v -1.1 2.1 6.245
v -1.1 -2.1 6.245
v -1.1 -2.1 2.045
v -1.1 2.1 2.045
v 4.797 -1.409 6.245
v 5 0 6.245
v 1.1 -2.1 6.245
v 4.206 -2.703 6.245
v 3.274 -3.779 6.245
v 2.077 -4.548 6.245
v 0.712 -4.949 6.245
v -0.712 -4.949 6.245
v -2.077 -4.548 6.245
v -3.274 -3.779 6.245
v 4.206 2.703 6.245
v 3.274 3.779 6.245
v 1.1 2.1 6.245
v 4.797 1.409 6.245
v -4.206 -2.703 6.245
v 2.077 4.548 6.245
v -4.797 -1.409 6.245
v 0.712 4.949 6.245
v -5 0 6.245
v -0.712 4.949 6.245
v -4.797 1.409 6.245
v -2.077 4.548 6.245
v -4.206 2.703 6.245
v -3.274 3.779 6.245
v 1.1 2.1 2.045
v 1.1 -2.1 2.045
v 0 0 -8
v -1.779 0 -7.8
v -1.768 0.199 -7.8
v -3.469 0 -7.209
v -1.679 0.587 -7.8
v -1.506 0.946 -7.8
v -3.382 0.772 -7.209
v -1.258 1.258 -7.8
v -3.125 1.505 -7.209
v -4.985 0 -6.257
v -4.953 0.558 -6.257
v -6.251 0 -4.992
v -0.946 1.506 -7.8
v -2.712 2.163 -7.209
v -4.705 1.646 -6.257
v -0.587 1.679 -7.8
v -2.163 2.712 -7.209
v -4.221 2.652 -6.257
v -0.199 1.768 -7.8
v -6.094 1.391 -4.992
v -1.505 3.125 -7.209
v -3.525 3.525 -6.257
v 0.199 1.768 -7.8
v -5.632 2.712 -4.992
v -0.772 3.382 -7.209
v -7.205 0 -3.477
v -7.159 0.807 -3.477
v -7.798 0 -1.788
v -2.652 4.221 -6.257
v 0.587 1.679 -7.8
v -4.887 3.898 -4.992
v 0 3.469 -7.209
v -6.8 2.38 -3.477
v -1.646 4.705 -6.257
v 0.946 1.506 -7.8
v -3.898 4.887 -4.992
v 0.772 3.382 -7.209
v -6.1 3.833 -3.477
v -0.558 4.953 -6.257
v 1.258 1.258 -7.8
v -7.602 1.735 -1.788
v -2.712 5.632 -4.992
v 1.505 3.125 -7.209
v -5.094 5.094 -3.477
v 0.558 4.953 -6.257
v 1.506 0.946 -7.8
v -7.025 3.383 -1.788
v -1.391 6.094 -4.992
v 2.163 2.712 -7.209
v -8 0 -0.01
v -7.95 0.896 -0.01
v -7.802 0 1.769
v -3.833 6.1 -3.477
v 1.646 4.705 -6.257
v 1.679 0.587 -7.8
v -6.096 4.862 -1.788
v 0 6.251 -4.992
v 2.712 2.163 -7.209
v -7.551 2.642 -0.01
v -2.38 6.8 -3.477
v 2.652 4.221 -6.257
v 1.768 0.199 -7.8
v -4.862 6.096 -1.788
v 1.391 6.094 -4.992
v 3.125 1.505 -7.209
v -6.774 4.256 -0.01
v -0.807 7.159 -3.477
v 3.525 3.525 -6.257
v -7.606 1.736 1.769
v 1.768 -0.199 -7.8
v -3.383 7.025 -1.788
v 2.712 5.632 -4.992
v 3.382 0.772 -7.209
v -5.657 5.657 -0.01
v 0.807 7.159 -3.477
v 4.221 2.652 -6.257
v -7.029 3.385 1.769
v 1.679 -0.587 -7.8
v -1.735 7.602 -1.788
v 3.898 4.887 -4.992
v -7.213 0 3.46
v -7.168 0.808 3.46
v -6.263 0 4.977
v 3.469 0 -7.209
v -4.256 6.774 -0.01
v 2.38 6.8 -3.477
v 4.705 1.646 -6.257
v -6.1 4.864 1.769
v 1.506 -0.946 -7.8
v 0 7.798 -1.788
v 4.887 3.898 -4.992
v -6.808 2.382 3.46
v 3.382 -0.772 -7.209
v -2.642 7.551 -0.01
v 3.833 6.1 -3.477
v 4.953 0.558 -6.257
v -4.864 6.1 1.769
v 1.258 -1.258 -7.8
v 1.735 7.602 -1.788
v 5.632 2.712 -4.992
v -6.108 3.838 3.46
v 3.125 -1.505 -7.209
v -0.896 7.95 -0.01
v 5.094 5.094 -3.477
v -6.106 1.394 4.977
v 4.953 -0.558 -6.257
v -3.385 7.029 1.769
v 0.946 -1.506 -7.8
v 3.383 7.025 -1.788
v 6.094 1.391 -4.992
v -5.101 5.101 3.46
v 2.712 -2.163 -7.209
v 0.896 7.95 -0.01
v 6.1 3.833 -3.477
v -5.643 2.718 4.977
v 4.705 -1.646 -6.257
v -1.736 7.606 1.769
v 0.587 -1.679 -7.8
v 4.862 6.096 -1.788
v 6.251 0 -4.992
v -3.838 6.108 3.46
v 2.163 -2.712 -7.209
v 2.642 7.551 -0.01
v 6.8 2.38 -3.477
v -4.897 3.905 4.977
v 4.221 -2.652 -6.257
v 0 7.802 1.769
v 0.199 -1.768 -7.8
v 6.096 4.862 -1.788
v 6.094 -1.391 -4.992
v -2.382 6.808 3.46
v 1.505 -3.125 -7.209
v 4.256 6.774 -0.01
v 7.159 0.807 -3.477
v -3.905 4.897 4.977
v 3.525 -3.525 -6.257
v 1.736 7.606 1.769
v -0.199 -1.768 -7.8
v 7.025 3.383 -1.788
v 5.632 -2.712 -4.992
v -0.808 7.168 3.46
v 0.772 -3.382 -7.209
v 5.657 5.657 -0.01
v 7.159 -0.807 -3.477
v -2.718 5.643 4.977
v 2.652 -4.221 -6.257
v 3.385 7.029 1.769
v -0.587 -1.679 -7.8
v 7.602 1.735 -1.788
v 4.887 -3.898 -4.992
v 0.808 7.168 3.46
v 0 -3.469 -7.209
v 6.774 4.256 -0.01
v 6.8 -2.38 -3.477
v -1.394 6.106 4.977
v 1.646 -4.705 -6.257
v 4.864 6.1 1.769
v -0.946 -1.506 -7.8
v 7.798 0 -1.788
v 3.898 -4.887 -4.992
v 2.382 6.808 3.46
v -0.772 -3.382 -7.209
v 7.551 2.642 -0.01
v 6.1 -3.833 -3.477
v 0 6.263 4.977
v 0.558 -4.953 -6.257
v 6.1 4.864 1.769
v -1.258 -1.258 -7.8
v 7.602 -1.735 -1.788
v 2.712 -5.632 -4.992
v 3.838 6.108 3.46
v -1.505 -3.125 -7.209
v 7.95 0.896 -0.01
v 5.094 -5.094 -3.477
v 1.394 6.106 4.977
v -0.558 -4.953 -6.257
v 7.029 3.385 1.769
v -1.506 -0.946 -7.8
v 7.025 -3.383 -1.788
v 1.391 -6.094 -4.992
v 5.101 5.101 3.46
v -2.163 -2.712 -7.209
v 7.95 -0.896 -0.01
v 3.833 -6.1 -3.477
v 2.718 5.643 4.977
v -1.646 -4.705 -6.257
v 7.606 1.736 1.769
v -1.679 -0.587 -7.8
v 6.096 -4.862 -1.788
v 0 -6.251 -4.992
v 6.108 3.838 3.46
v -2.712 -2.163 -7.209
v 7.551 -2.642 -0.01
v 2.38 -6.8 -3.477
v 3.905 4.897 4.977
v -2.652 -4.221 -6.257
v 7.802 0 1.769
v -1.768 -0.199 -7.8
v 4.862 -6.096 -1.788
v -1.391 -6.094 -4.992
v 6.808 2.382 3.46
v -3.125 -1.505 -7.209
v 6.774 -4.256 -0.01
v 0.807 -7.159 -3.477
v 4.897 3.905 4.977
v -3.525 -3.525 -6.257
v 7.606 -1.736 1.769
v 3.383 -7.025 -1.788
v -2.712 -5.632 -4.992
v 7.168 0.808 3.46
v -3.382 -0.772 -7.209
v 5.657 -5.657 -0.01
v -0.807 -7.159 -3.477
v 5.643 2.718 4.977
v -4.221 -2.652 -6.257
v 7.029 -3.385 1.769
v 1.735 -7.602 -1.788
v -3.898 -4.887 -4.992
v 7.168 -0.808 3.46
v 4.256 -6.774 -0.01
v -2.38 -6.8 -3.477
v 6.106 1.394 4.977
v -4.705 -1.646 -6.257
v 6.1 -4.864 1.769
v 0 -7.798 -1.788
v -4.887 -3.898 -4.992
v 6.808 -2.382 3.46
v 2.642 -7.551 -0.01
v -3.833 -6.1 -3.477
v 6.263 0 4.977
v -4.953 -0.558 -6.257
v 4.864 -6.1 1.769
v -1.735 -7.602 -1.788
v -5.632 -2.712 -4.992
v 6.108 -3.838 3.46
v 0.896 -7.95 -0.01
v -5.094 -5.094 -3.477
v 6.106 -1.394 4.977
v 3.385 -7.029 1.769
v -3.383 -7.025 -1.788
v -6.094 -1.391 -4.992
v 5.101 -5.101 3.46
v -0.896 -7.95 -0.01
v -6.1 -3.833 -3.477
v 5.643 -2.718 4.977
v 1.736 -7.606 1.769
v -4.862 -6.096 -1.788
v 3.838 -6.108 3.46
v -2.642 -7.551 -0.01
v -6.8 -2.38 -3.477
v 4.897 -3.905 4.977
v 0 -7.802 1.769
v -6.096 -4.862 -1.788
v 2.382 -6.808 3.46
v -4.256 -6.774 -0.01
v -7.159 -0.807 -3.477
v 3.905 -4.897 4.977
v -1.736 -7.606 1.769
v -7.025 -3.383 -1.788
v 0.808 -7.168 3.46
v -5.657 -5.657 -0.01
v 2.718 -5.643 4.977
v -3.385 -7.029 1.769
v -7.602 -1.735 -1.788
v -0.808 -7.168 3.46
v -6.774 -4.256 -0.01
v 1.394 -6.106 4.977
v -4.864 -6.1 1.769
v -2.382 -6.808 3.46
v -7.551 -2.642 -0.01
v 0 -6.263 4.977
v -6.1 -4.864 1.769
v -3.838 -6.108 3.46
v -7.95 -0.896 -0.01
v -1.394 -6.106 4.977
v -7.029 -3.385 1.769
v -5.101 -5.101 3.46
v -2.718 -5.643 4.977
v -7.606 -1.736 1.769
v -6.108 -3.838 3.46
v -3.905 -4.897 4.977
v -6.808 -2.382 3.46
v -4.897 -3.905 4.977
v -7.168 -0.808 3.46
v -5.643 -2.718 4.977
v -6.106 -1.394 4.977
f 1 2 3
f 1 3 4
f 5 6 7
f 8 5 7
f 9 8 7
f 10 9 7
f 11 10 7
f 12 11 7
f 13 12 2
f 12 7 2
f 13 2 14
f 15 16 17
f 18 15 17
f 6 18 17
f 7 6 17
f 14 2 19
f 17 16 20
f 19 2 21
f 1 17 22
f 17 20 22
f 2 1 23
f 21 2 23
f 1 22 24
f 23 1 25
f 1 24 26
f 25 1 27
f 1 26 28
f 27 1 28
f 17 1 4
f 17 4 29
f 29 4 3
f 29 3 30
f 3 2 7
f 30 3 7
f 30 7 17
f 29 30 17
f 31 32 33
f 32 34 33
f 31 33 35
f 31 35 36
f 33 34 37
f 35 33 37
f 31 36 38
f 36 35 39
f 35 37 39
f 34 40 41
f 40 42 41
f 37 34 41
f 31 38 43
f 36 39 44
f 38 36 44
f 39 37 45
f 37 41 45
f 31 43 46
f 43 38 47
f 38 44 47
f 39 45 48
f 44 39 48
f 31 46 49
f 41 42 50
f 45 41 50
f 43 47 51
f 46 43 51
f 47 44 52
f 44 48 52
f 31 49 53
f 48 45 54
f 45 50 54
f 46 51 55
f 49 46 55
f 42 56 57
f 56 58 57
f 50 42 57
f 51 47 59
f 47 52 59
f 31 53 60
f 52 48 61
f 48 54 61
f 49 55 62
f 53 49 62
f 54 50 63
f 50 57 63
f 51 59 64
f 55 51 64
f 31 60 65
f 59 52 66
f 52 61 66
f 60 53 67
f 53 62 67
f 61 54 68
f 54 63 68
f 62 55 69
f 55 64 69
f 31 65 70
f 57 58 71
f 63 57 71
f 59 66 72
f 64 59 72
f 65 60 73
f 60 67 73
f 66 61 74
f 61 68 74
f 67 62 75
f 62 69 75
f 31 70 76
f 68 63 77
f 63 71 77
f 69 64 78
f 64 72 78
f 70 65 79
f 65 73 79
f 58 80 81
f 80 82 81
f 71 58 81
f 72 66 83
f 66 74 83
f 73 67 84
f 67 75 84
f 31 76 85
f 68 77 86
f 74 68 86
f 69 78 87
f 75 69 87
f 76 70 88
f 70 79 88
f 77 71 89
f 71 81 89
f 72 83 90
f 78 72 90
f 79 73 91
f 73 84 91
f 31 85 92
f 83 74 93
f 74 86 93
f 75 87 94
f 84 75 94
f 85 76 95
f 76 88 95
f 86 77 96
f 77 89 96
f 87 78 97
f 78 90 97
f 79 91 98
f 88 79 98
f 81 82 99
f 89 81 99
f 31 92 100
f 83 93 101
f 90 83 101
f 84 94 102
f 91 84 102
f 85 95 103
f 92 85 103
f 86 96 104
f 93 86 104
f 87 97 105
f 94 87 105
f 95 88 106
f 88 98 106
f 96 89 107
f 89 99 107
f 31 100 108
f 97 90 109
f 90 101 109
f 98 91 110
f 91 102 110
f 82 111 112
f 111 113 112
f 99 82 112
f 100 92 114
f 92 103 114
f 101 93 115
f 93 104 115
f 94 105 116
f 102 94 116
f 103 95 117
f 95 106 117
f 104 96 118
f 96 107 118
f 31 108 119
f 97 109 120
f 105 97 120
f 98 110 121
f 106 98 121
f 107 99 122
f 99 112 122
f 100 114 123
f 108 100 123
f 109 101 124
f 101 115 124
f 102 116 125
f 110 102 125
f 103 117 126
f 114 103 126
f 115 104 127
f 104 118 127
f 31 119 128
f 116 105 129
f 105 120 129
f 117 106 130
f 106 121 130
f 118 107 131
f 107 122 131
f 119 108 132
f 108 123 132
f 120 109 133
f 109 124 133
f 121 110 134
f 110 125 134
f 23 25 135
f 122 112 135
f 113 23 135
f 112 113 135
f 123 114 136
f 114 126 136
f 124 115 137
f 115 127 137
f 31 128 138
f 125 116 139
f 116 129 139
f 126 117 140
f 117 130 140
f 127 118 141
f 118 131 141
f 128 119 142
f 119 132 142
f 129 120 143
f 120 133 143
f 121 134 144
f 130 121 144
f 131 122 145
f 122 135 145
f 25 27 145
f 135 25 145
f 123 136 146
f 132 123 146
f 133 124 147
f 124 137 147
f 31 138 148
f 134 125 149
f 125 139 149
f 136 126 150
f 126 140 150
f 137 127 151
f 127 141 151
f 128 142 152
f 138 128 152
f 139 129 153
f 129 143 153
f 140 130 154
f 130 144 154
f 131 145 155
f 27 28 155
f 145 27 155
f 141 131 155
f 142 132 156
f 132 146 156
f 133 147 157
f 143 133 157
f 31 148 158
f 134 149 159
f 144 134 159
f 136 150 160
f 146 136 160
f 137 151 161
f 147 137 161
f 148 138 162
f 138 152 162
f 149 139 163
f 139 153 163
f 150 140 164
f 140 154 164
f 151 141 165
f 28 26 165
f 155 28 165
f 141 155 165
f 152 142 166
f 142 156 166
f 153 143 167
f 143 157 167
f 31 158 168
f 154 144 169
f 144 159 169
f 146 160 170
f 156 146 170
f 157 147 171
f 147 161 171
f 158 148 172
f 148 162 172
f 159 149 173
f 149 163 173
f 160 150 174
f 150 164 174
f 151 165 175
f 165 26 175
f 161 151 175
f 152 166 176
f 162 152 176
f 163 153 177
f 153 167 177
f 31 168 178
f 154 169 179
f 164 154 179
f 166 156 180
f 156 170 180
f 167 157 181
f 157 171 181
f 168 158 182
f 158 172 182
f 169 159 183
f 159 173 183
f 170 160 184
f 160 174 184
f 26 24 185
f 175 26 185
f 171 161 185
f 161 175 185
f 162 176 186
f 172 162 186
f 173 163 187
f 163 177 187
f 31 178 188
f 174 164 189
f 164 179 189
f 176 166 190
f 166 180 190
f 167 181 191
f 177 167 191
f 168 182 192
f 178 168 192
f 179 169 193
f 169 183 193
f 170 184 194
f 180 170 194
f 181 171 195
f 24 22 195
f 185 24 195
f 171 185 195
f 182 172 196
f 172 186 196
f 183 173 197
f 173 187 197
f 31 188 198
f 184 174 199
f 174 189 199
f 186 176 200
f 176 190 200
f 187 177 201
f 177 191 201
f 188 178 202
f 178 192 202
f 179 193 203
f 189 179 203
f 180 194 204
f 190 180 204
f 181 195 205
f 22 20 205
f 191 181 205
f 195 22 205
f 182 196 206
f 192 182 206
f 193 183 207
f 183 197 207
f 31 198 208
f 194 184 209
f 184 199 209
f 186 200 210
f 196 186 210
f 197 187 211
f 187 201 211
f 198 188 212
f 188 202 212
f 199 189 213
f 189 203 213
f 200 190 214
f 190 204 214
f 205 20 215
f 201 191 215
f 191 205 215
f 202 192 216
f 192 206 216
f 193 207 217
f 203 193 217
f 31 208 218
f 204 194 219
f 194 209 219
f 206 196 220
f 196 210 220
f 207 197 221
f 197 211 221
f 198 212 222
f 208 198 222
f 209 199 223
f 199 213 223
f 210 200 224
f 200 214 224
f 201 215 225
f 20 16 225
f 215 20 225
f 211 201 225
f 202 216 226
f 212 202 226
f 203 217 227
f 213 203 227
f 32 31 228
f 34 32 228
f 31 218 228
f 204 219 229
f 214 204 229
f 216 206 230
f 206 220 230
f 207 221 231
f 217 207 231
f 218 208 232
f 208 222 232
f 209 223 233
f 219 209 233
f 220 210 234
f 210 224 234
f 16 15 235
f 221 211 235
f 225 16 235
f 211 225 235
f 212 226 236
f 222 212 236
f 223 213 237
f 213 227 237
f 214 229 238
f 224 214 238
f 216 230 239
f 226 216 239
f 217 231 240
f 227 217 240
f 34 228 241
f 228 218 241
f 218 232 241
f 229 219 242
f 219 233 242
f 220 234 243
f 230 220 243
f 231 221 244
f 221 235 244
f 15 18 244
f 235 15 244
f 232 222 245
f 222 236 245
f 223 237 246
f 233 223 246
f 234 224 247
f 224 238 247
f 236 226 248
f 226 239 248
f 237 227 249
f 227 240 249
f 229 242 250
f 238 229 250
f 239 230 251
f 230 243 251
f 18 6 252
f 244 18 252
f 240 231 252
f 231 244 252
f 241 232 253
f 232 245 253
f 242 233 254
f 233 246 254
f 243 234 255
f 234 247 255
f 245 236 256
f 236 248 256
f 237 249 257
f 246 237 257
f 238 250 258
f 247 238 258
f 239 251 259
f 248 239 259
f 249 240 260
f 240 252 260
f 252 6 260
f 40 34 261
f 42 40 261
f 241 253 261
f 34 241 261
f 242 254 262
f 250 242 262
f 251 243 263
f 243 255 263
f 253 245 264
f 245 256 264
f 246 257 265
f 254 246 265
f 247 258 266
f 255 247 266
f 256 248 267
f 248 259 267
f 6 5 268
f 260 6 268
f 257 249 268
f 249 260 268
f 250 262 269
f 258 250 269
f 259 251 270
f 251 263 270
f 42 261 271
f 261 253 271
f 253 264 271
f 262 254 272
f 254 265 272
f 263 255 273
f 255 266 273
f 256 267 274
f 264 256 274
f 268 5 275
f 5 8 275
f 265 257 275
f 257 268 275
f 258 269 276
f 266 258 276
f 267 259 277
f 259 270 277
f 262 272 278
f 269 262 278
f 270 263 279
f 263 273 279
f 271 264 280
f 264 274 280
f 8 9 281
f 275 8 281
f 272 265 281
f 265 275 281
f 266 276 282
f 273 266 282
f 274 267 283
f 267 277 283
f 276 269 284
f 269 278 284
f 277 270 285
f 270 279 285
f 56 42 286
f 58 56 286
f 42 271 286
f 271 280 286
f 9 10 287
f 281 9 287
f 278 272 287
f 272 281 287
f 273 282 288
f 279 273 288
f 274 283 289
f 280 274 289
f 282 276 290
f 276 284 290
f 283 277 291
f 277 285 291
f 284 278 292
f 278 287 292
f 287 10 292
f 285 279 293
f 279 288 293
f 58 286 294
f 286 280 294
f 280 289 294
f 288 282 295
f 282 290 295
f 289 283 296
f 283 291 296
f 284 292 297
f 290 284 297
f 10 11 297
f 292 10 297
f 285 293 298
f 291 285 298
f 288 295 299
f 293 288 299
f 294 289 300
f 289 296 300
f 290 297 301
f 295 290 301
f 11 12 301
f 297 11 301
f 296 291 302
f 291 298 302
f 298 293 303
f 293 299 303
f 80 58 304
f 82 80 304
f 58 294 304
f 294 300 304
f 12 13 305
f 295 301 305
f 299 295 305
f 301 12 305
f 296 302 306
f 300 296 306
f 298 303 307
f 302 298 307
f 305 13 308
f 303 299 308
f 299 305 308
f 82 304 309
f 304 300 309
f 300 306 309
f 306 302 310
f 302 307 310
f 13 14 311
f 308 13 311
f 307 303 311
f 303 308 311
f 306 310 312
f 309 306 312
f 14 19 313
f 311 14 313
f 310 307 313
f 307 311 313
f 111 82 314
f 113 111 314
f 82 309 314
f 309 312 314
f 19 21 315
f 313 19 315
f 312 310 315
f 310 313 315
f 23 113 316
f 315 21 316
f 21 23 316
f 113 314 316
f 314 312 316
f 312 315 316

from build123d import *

# Parameters (mm, degrees)
SKETCH_2_W          = 2.2
SKETCH_2_H          = 4.2
CUT_EXTRUDE_1_DEPTH = 4.2


with BuildPart() as part:
    # 草图1 → 旋转2 (revolve)
    with BuildSketch(Plane(origin=(0, 0, 0), x_dir=(1, 0, 0), z_dir=(0, 1, 0))):
        with BuildLine():
            Line((-5, -6.244997998), (0, -6.244997998))
            Line((0, -6.244997998), (0, 8))
            ThreePointArc((0, 8), (-7.548509256, 2.649529771), (-5, -6.244997998))
        make_face()
    revolve(axis=Axis((0, 0, 6.244997998), (0, 0, -1)))

    # 草图2 → 切除-拉伸1 (cut)
    with BuildSketch(Plane.XY.offset(6.244997998)):
        Rectangle(SKETCH_2_W, SKETCH_2_H)
    extrude(amount=-CUT_EXTRUDE_1_DEPTH, mode=Mode.SUBTRACT)


solid = part.part
